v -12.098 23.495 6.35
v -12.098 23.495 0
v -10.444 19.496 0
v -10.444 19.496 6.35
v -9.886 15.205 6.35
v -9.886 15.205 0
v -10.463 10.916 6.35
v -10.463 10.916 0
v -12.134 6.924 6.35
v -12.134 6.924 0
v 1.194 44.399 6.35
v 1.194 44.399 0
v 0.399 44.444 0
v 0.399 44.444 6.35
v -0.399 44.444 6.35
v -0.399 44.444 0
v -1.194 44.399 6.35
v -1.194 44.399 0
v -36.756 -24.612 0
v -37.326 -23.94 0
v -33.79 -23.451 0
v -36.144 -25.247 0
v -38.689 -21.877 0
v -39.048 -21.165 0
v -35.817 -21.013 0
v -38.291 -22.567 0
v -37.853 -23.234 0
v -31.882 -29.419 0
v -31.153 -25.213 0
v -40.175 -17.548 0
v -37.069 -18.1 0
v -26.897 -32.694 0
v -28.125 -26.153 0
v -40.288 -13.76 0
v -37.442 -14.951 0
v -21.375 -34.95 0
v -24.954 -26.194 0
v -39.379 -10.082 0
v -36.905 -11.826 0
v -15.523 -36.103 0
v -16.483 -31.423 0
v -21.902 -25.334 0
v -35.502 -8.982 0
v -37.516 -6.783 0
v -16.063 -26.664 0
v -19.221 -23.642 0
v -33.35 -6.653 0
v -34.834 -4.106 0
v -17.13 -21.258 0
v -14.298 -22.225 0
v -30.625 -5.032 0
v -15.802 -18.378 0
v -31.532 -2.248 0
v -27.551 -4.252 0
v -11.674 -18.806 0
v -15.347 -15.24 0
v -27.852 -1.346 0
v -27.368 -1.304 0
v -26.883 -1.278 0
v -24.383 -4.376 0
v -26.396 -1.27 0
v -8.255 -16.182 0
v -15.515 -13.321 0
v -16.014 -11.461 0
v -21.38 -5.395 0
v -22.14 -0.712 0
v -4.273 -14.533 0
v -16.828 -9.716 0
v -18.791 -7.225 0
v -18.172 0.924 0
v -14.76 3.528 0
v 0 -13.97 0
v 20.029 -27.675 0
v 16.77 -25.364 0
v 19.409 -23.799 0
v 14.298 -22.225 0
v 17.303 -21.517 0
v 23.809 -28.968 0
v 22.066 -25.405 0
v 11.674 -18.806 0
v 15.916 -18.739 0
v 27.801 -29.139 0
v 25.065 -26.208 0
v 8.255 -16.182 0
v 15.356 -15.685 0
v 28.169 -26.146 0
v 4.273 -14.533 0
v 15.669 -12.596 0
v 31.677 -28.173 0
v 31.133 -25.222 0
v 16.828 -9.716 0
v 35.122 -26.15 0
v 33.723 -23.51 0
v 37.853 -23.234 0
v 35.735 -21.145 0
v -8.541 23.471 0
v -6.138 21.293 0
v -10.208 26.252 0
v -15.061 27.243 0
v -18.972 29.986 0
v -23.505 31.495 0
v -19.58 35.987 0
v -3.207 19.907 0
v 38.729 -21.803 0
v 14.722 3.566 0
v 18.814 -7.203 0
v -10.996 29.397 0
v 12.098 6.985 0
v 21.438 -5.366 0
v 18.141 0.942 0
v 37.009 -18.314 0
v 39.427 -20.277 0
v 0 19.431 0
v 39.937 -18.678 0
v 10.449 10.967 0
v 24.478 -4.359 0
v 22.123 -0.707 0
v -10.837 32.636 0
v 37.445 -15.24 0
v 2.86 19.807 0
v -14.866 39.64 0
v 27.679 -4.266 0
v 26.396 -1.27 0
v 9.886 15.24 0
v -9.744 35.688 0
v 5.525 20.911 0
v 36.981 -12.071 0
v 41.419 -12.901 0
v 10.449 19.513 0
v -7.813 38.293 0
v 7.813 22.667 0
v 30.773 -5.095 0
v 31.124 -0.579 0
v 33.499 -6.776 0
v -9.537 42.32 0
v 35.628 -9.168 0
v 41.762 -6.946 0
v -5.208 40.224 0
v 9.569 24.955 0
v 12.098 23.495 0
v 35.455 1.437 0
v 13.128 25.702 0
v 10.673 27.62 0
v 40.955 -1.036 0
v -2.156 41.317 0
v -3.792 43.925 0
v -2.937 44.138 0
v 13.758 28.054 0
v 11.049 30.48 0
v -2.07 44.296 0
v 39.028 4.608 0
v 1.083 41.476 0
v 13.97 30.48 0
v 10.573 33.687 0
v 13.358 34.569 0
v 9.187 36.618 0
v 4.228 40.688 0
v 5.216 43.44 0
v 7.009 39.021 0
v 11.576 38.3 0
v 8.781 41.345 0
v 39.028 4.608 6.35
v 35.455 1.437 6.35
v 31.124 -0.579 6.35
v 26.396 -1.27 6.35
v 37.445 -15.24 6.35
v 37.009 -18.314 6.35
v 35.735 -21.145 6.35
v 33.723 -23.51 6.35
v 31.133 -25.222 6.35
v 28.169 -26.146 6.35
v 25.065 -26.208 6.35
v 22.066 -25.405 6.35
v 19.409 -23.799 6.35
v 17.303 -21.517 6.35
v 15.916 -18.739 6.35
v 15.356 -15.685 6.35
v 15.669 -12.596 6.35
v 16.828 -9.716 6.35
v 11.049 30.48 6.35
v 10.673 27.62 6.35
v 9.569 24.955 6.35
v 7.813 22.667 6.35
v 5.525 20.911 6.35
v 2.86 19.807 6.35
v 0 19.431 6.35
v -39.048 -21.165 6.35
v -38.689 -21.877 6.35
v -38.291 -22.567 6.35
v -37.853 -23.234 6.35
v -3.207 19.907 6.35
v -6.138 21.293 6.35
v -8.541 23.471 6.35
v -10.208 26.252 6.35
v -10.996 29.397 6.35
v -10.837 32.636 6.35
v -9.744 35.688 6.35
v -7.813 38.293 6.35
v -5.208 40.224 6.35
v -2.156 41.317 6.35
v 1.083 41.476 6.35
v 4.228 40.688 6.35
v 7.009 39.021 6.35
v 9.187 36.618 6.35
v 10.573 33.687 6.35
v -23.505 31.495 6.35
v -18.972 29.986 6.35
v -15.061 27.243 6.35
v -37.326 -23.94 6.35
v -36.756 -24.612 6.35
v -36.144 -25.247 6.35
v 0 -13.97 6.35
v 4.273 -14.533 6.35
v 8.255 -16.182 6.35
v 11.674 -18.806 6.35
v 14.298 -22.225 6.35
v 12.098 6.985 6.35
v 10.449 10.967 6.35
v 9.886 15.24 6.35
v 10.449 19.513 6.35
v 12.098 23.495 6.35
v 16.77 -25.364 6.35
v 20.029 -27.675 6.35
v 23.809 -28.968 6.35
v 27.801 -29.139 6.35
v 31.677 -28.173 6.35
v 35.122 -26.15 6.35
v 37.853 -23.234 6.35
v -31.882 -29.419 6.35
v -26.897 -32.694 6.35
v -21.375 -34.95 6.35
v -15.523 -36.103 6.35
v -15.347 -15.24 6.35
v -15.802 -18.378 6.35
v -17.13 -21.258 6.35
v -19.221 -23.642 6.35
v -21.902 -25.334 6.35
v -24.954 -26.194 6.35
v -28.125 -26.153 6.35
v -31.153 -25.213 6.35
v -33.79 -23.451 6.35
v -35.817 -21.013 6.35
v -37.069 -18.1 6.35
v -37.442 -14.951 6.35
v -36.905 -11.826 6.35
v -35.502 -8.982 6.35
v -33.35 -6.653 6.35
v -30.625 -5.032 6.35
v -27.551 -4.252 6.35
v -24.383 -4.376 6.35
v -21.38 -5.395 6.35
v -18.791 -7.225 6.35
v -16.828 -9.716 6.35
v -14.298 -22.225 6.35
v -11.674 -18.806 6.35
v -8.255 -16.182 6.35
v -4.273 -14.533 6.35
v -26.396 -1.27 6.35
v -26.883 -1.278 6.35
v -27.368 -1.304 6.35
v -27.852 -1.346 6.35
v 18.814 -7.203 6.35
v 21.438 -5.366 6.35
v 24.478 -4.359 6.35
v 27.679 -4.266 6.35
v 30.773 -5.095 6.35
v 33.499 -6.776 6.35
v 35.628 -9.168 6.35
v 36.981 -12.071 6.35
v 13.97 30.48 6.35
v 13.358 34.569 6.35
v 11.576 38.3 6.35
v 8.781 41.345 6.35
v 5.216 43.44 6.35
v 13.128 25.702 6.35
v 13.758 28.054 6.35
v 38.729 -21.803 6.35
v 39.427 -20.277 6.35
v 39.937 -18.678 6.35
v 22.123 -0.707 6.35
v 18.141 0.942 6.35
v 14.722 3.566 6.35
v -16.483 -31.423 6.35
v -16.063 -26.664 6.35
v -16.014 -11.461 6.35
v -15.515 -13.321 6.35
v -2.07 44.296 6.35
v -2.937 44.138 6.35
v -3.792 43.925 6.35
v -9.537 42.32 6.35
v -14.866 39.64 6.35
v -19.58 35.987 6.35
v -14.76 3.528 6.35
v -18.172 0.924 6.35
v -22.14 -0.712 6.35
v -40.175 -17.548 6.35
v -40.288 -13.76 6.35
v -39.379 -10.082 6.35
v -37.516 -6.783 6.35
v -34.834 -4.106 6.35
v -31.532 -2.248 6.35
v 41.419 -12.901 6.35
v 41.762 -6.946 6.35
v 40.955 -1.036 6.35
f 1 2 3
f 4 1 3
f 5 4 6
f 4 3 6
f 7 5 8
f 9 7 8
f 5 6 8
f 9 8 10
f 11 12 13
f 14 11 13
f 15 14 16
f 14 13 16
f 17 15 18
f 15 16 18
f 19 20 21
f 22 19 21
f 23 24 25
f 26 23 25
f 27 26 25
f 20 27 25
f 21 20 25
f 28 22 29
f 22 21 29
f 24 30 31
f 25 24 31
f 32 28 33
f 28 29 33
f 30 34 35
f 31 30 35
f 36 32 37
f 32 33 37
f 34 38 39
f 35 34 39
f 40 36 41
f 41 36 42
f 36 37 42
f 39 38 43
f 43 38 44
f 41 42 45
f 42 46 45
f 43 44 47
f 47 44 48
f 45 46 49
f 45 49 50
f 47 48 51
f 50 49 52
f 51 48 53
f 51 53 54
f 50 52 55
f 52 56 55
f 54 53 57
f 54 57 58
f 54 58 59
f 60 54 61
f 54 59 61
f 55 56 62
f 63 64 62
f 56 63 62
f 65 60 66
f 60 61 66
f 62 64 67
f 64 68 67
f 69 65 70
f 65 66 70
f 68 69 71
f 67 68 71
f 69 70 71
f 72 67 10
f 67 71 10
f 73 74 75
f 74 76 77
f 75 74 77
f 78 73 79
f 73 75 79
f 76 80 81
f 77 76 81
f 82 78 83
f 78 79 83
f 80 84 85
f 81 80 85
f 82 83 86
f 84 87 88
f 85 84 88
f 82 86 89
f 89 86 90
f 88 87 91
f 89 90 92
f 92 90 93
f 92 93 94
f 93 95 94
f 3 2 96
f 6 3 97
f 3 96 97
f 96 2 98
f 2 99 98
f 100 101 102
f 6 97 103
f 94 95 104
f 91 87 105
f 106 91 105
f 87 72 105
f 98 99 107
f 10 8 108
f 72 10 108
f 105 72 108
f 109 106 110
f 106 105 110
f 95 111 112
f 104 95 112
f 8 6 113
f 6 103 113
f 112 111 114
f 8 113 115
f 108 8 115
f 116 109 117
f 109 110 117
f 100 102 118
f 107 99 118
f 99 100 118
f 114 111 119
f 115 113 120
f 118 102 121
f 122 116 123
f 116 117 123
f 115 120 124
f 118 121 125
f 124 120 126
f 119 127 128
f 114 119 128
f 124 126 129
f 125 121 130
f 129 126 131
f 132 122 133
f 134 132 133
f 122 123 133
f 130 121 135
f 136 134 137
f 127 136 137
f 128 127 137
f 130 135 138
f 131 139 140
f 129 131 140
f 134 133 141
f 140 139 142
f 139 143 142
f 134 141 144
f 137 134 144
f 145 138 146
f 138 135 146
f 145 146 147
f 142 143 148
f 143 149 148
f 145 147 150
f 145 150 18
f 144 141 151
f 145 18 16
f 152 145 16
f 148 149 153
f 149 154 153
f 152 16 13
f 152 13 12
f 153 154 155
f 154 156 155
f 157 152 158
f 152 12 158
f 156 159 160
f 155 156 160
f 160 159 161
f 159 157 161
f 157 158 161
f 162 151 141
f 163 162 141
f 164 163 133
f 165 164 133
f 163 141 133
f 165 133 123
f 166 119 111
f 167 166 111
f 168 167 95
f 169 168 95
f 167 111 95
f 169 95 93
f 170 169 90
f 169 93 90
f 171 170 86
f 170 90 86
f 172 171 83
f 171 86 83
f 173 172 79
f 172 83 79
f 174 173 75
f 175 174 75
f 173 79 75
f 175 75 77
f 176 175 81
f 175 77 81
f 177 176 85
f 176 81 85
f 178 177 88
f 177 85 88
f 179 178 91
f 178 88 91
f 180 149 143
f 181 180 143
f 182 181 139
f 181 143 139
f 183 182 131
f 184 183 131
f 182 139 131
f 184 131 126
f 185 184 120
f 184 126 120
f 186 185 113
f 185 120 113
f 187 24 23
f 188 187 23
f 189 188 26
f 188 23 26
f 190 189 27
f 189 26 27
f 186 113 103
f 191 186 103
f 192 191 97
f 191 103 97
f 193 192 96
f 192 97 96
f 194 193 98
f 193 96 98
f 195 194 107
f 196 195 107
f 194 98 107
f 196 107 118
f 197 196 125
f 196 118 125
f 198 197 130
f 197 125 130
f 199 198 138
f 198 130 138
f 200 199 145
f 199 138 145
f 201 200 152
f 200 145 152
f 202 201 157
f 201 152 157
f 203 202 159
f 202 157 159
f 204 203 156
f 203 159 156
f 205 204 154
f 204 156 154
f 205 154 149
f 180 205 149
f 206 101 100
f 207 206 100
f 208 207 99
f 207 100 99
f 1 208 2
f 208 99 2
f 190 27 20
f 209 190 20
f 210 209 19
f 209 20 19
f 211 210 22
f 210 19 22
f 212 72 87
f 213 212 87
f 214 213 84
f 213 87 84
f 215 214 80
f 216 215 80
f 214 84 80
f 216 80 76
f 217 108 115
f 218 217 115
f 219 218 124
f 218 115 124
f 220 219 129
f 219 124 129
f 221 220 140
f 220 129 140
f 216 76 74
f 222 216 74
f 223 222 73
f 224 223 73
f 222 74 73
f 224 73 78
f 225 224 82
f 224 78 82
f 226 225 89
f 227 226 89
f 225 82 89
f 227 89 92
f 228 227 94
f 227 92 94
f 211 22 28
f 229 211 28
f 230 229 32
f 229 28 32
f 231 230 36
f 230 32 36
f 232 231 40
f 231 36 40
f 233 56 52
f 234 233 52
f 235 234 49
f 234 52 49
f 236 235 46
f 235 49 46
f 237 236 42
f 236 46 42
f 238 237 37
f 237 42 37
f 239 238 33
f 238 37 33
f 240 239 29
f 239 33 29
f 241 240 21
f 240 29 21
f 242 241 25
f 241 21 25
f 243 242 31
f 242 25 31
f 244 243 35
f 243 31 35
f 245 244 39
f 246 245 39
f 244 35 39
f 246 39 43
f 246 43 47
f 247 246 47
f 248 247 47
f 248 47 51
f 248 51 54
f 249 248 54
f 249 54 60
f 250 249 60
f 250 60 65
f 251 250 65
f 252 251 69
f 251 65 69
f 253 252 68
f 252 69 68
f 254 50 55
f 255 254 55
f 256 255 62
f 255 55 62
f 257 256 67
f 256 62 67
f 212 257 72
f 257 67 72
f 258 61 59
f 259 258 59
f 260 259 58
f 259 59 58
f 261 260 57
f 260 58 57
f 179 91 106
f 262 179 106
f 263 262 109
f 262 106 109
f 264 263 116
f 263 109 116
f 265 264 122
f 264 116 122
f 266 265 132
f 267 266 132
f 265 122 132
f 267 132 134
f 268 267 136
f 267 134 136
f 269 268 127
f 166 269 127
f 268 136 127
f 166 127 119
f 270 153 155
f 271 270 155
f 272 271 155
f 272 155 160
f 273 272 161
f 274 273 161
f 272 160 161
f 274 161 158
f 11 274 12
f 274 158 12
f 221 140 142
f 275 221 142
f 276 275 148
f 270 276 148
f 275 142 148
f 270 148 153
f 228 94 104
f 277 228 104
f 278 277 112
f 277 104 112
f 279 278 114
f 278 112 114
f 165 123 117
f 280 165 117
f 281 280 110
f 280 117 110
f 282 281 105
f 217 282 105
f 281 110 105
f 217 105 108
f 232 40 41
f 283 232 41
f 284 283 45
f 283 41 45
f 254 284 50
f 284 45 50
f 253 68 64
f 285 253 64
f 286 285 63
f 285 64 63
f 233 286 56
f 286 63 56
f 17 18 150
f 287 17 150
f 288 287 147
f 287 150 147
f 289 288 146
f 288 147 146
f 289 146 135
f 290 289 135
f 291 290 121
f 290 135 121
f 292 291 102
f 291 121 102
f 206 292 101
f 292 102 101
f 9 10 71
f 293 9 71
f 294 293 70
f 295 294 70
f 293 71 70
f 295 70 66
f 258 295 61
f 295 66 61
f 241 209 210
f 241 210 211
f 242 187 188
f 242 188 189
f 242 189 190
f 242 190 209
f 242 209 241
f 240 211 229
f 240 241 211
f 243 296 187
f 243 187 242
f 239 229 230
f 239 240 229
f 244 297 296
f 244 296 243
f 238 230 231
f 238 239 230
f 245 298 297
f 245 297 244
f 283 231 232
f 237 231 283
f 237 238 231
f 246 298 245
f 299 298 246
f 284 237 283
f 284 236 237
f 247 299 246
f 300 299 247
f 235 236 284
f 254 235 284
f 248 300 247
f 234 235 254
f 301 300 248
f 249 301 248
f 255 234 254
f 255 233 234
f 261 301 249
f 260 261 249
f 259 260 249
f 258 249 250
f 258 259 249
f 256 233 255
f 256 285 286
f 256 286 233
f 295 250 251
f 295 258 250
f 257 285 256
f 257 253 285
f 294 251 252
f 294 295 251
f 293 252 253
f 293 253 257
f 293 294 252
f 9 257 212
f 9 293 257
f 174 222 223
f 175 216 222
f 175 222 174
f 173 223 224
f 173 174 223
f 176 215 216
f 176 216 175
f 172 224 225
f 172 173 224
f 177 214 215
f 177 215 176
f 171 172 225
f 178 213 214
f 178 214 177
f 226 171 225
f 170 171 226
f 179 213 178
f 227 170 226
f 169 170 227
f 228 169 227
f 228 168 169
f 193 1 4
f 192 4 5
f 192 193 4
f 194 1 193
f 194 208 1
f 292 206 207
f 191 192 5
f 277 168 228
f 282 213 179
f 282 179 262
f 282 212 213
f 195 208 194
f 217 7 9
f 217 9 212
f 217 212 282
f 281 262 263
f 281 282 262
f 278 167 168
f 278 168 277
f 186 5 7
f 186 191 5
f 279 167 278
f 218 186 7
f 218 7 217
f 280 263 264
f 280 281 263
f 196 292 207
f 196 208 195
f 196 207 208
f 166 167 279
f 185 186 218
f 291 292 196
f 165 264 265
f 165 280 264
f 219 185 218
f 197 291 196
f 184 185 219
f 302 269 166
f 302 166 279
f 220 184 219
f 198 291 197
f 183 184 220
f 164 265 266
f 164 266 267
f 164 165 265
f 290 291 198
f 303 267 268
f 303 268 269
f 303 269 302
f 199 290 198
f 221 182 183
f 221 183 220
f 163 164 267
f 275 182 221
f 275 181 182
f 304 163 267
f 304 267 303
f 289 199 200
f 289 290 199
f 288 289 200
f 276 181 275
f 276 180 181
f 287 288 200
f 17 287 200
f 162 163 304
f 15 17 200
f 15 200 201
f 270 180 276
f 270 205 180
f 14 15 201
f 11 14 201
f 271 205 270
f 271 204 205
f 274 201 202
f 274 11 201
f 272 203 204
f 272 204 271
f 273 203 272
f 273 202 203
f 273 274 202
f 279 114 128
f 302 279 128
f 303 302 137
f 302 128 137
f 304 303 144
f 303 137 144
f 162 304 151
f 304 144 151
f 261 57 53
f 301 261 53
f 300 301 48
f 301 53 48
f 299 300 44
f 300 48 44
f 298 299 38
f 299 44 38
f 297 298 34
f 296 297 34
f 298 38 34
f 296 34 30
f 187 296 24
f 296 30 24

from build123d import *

# Parameters (mm, degrees)
F1_DEPTH = 6.35


with BuildPart() as f1:
    # F0 (on Top) → F1 (new body)
    with BuildSketch(Plane.XY):
        with BuildLine():
            Line((-14.298079, -8.255), (0, 0))
            Line((0, 0), (0, 16.51))
            ThreePointArc((0, 16.51), (-6.985, 18.381625), (-12.098375, 23.495))
            ThreePointArc((-12.098375, 23.495), (-9.886492, 15.204646), (-12.13386, 6.923841))
            ThreePointArc((-12.13386, 6.923841), (-18.172091, 0.924276), (-26.396454, -1.27))
            ThreePointArc((-26.396454, -1.27), (-25.702754, -1.287234), (-25.010766, -1.338893))
            ThreePointArc((-25.010766, -1.338893), (-18.819309, -3.5034), (-14.298079, -8.255))
        make_face()
        with BuildLine():
            Line((0, -13.97), (0, 0))
            Line((0, 0), (-14.298079, -8.255))
            ThreePointArc((-14.298079, -8.255), (-12.902471, -11.624298), (-12.426454, -15.24))
            ThreePointArc((-12.426454, -15.24), (-12.902471, -18.855702), (-14.298079, -22.225))
            ThreePointArc((-14.298079, -22.225), (-8.255, -16.181921), (0, -13.97))
        make_face()
        with BuildLine():
            Line((12.098375, 6.985), (0, 0))
            Line((0, 0), (14.298079, -8.255))
            ThreePointArc((14.298079, -8.255), (19.411454, -3.141625), (26.396454, -1.27))
            ThreePointArc((26.396454, -1.27), (18.141454, 0.941921), (12.098375, 6.985))
        make_face()
        with BuildLine():
            Line((14.298079, -8.255), (0, 0))
            Line((0, 0), (0, -13.97))
            ThreePointArc((0, -13.97), (8.255, -16.181921), (14.298079, -22.225))
            ThreePointArc((14.298079, -22.225), (12.426454, -15.24), (14.298079, -8.255))
        make_face()
        with BuildLine():
            Line((0, 16.51), (0, 0))
            Line((0, 0), (12.098375, 6.985))
            ThreePointArc((12.098375, 6.985), (9.886454, 15.24), (12.098375, 23.495))
            ThreePointArc((12.098375, 23.495), (6.985, 18.381625), (0, 16.51))
        make_face()
        with BuildLine():
            ThreePointArc((11.049, 30.48), (-7.812823, 38.292823), (0, 19.431))
            ThreePointArc((0, 19.431), (7.812823, 22.667177), (11.049, 30.48))
        make_face()
        with BuildLine():
            ThreePointArc((-12.098375, 23.495), (-6.985, 18.381625), (0, 16.51))
            ThreePointArc((0, 16.51), (6.985, 18.381625), (12.098375, 23.495))
            ThreePointArc((12.098375, 23.495), (13.493984, 26.864298), (13.97, 30.48))
            ThreePointArc((13.97, 30.48), (10.291919, 39.92655), (1.194438, 44.398844))
            ThreePointArc((1.194438, 44.398844), (-1.30857, 44.263376), (-3.792353, 43.925407))
            ThreePointArc((-3.792353, 43.925407), (-12.941375, 35.741341), (-12.098375, 23.495))
        make_face()
        with BuildLine():
            ThreePointArc((11.049, 30.48), (7.812823, 22.667177), (0, 19.431))
            ThreePointArc((0, 19.431), (-7.812823, 38.292823), (11.049, 30.48))
        make_face(mode=Mode.SUBTRACT)
        with BuildLine():
            ThreePointArc((-15.347454, -15.24), (-15.72394, -12.380308), (-16.82774, -9.7155))
            ThreePointArc((-16.82774, -9.7155), (-37.068969, -18.099692), (-15.347454, -15.24))
        make_face()
        with BuildLine():
            ThreePointArc((-12.426454, -15.24), (-12.902471, -11.624298), (-14.298079, -8.255))
            ThreePointArc((-14.298079, -8.255), (-18.819309, -3.5034), (-25.010766, -1.338893))
            ThreePointArc((-25.010766, -1.338893), (-26.431469, -1.403743), (-27.852483, -1.346085))
            ThreePointArc((-27.852483, -1.346085), (-38.559988, -8.369094), (-39.047746, -21.165008))
            ThreePointArc((-39.047746, -21.165008), (-37.678923, -23.264942), (-36.144342, -25.246977))
            ThreePointArc((-36.144342, -25.246977), (-24.482222, -29.07823), (-14.298079, -22.225))
            ThreePointArc((-14.298079, -22.225), (-12.902471, -18.855702), (-12.426454, -15.24))
        make_face()
        with BuildLine():
            ThreePointArc((-15.347454, -15.24), (-37.068969, -18.099692), (-16.82774, -9.7155))
            ThreePointArc((-16.82774, -9.7155), (-15.72394, -12.380308), (-15.347454, -15.24))
        make_face(mode=Mode.SUBTRACT)
        with BuildLine():
            ThreePointArc((37.445454, -15.24), (29.256146, -4.567486), (16.82774, -9.7155))
            ThreePointArc((16.82774, -9.7155), (23.536763, -25.912514), (37.445454, -15.24))
        make_face()
        with BuildLine():
            ThreePointArc((26.396454, -1.27), (19.411454, -3.141625), (14.298079, -8.255))
            ThreePointArc((14.298079, -8.255), (12.426454, -15.24), (14.298079, -22.225))
            ThreePointArc((14.298079, -22.225), (25.798688, -29.197205), (37.853308, -23.233836))
            ThreePointArc((37.853308, -23.233836), (38.987493, -20.998433), (39.936694, -18.678429))
            ThreePointArc((39.936694, -18.678429), (40.258598, -16.972591), (40.366454, -15.24))
            ThreePointArc((40.366454, -15.24), (36.274736, -5.361718), (26.396454, -1.27))
        make_face()
        with BuildLine():
            ThreePointArc((37.445454, -15.24), (23.536763, -25.912514), (16.82774, -9.7155))
            ThreePointArc((16.82774, -9.7155), (29.256146, -4.567486), (37.445454, -15.24))
        make_face(mode=Mode.SUBTRACT)
        with BuildLine():
            ThreePointArc((-23.504818, 31.494801), (-16.916434, 28.757001), (-12.098375, 23.495))
            ThreePointArc((-12.098375, 23.495), (-12.941375, 35.741341), (-3.792353, 43.925407))
            ThreePointArc((-3.792353, 43.925407), (-14.865803, 39.640368), (-23.504818, 31.494801))
        make_face()
        with BuildLine():
            ThreePointArc((-27.852483, -1.346085), (-26.431469, -1.403743), (-25.010766, -1.338893))
            ThreePointArc((-25.010766, -1.338893), (-25.702754, -1.287234), (-26.396454, -1.27))
            ThreePointArc((-26.396454, -1.27), (-27.125462, -1.289034), (-27.852483, -1.346085))
        make_face()
        with BuildLine():
            ThreePointArc((39.027706, 4.608369), (33.362511, 0.271561), (26.396454, -1.27))
            ThreePointArc((26.396454, -1.27), (36.274736, -5.361718), (40.366454, -15.24))
            ThreePointArc((40.366454, -15.24), (40.258598, -16.972591), (39.936694, -18.678429))
            ThreePointArc((39.936694, -18.678429), (41.762467, -6.946021), (39.027706, 4.608369))
        make_face()
        with BuildLine():
            ThreePointArc((-15.522888, -36.10317), (-16.446076, -29.028562), (-14.298079, -22.225))
            ThreePointArc((-14.298079, -22.225), (-24.482222, -29.07823), (-36.144342, -25.246977))
            ThreePointArc((-36.144342, -25.246977), (-26.896664, -32.694347), (-15.522888, -36.10317))
        make_face()
        with BuildLine():
            ThreePointArc((-1.194438, 44.398844), (-2.504607, 44.223647), (-3.792353, 43.925407))
            ThreePointArc((-3.792353, 43.925407), (-1.30857, 44.263376), (1.194438, 44.398844))
            ThreePointArc((1.194438, 44.398844), (0, 44.414908), (-1.194438, 44.398844))
        make_face()
        with BuildLine():
            ThreePointArc((39.936694, -18.678429), (38.987493, -20.998433), (37.853308, -23.233836))
            ThreePointArc((37.853308, -23.233836), (39.100847, -21.050275), (39.936694, -18.678429))
        make_face()
        with BuildLine():
            ThreePointArc((-37.853308, -23.233836), (-37.046498, -24.280877), (-36.144342, -25.246977))
            ThreePointArc((-36.144342, -25.246977), (-37.678923, -23.264942), (-39.047746, -21.165008))
            ThreePointArc((-39.047746, -21.165008), (-38.464438, -22.207454), (-37.853308, -23.233836))
        make_face()
        with BuildLine():
            ThreePointArc((1.194438, 44.398844), (0, 44.45), (-1.194438, 44.398844))
            ThreePointArc((-1.194438, 44.398844), (0, 44.414908), (1.194438, 44.398844))
        make_face()
        with BuildLine():
            ThreePointArc((-37.853308, -23.233836), (-38.464438, -22.207454), (-39.047746, -21.165008))
            ThreePointArc((-39.047746, -21.165008), (-38.494829, -22.225), (-37.853308, -23.233836))
        make_face()
    extrude(amount=F1_DEPTH)


solid = f1.part
